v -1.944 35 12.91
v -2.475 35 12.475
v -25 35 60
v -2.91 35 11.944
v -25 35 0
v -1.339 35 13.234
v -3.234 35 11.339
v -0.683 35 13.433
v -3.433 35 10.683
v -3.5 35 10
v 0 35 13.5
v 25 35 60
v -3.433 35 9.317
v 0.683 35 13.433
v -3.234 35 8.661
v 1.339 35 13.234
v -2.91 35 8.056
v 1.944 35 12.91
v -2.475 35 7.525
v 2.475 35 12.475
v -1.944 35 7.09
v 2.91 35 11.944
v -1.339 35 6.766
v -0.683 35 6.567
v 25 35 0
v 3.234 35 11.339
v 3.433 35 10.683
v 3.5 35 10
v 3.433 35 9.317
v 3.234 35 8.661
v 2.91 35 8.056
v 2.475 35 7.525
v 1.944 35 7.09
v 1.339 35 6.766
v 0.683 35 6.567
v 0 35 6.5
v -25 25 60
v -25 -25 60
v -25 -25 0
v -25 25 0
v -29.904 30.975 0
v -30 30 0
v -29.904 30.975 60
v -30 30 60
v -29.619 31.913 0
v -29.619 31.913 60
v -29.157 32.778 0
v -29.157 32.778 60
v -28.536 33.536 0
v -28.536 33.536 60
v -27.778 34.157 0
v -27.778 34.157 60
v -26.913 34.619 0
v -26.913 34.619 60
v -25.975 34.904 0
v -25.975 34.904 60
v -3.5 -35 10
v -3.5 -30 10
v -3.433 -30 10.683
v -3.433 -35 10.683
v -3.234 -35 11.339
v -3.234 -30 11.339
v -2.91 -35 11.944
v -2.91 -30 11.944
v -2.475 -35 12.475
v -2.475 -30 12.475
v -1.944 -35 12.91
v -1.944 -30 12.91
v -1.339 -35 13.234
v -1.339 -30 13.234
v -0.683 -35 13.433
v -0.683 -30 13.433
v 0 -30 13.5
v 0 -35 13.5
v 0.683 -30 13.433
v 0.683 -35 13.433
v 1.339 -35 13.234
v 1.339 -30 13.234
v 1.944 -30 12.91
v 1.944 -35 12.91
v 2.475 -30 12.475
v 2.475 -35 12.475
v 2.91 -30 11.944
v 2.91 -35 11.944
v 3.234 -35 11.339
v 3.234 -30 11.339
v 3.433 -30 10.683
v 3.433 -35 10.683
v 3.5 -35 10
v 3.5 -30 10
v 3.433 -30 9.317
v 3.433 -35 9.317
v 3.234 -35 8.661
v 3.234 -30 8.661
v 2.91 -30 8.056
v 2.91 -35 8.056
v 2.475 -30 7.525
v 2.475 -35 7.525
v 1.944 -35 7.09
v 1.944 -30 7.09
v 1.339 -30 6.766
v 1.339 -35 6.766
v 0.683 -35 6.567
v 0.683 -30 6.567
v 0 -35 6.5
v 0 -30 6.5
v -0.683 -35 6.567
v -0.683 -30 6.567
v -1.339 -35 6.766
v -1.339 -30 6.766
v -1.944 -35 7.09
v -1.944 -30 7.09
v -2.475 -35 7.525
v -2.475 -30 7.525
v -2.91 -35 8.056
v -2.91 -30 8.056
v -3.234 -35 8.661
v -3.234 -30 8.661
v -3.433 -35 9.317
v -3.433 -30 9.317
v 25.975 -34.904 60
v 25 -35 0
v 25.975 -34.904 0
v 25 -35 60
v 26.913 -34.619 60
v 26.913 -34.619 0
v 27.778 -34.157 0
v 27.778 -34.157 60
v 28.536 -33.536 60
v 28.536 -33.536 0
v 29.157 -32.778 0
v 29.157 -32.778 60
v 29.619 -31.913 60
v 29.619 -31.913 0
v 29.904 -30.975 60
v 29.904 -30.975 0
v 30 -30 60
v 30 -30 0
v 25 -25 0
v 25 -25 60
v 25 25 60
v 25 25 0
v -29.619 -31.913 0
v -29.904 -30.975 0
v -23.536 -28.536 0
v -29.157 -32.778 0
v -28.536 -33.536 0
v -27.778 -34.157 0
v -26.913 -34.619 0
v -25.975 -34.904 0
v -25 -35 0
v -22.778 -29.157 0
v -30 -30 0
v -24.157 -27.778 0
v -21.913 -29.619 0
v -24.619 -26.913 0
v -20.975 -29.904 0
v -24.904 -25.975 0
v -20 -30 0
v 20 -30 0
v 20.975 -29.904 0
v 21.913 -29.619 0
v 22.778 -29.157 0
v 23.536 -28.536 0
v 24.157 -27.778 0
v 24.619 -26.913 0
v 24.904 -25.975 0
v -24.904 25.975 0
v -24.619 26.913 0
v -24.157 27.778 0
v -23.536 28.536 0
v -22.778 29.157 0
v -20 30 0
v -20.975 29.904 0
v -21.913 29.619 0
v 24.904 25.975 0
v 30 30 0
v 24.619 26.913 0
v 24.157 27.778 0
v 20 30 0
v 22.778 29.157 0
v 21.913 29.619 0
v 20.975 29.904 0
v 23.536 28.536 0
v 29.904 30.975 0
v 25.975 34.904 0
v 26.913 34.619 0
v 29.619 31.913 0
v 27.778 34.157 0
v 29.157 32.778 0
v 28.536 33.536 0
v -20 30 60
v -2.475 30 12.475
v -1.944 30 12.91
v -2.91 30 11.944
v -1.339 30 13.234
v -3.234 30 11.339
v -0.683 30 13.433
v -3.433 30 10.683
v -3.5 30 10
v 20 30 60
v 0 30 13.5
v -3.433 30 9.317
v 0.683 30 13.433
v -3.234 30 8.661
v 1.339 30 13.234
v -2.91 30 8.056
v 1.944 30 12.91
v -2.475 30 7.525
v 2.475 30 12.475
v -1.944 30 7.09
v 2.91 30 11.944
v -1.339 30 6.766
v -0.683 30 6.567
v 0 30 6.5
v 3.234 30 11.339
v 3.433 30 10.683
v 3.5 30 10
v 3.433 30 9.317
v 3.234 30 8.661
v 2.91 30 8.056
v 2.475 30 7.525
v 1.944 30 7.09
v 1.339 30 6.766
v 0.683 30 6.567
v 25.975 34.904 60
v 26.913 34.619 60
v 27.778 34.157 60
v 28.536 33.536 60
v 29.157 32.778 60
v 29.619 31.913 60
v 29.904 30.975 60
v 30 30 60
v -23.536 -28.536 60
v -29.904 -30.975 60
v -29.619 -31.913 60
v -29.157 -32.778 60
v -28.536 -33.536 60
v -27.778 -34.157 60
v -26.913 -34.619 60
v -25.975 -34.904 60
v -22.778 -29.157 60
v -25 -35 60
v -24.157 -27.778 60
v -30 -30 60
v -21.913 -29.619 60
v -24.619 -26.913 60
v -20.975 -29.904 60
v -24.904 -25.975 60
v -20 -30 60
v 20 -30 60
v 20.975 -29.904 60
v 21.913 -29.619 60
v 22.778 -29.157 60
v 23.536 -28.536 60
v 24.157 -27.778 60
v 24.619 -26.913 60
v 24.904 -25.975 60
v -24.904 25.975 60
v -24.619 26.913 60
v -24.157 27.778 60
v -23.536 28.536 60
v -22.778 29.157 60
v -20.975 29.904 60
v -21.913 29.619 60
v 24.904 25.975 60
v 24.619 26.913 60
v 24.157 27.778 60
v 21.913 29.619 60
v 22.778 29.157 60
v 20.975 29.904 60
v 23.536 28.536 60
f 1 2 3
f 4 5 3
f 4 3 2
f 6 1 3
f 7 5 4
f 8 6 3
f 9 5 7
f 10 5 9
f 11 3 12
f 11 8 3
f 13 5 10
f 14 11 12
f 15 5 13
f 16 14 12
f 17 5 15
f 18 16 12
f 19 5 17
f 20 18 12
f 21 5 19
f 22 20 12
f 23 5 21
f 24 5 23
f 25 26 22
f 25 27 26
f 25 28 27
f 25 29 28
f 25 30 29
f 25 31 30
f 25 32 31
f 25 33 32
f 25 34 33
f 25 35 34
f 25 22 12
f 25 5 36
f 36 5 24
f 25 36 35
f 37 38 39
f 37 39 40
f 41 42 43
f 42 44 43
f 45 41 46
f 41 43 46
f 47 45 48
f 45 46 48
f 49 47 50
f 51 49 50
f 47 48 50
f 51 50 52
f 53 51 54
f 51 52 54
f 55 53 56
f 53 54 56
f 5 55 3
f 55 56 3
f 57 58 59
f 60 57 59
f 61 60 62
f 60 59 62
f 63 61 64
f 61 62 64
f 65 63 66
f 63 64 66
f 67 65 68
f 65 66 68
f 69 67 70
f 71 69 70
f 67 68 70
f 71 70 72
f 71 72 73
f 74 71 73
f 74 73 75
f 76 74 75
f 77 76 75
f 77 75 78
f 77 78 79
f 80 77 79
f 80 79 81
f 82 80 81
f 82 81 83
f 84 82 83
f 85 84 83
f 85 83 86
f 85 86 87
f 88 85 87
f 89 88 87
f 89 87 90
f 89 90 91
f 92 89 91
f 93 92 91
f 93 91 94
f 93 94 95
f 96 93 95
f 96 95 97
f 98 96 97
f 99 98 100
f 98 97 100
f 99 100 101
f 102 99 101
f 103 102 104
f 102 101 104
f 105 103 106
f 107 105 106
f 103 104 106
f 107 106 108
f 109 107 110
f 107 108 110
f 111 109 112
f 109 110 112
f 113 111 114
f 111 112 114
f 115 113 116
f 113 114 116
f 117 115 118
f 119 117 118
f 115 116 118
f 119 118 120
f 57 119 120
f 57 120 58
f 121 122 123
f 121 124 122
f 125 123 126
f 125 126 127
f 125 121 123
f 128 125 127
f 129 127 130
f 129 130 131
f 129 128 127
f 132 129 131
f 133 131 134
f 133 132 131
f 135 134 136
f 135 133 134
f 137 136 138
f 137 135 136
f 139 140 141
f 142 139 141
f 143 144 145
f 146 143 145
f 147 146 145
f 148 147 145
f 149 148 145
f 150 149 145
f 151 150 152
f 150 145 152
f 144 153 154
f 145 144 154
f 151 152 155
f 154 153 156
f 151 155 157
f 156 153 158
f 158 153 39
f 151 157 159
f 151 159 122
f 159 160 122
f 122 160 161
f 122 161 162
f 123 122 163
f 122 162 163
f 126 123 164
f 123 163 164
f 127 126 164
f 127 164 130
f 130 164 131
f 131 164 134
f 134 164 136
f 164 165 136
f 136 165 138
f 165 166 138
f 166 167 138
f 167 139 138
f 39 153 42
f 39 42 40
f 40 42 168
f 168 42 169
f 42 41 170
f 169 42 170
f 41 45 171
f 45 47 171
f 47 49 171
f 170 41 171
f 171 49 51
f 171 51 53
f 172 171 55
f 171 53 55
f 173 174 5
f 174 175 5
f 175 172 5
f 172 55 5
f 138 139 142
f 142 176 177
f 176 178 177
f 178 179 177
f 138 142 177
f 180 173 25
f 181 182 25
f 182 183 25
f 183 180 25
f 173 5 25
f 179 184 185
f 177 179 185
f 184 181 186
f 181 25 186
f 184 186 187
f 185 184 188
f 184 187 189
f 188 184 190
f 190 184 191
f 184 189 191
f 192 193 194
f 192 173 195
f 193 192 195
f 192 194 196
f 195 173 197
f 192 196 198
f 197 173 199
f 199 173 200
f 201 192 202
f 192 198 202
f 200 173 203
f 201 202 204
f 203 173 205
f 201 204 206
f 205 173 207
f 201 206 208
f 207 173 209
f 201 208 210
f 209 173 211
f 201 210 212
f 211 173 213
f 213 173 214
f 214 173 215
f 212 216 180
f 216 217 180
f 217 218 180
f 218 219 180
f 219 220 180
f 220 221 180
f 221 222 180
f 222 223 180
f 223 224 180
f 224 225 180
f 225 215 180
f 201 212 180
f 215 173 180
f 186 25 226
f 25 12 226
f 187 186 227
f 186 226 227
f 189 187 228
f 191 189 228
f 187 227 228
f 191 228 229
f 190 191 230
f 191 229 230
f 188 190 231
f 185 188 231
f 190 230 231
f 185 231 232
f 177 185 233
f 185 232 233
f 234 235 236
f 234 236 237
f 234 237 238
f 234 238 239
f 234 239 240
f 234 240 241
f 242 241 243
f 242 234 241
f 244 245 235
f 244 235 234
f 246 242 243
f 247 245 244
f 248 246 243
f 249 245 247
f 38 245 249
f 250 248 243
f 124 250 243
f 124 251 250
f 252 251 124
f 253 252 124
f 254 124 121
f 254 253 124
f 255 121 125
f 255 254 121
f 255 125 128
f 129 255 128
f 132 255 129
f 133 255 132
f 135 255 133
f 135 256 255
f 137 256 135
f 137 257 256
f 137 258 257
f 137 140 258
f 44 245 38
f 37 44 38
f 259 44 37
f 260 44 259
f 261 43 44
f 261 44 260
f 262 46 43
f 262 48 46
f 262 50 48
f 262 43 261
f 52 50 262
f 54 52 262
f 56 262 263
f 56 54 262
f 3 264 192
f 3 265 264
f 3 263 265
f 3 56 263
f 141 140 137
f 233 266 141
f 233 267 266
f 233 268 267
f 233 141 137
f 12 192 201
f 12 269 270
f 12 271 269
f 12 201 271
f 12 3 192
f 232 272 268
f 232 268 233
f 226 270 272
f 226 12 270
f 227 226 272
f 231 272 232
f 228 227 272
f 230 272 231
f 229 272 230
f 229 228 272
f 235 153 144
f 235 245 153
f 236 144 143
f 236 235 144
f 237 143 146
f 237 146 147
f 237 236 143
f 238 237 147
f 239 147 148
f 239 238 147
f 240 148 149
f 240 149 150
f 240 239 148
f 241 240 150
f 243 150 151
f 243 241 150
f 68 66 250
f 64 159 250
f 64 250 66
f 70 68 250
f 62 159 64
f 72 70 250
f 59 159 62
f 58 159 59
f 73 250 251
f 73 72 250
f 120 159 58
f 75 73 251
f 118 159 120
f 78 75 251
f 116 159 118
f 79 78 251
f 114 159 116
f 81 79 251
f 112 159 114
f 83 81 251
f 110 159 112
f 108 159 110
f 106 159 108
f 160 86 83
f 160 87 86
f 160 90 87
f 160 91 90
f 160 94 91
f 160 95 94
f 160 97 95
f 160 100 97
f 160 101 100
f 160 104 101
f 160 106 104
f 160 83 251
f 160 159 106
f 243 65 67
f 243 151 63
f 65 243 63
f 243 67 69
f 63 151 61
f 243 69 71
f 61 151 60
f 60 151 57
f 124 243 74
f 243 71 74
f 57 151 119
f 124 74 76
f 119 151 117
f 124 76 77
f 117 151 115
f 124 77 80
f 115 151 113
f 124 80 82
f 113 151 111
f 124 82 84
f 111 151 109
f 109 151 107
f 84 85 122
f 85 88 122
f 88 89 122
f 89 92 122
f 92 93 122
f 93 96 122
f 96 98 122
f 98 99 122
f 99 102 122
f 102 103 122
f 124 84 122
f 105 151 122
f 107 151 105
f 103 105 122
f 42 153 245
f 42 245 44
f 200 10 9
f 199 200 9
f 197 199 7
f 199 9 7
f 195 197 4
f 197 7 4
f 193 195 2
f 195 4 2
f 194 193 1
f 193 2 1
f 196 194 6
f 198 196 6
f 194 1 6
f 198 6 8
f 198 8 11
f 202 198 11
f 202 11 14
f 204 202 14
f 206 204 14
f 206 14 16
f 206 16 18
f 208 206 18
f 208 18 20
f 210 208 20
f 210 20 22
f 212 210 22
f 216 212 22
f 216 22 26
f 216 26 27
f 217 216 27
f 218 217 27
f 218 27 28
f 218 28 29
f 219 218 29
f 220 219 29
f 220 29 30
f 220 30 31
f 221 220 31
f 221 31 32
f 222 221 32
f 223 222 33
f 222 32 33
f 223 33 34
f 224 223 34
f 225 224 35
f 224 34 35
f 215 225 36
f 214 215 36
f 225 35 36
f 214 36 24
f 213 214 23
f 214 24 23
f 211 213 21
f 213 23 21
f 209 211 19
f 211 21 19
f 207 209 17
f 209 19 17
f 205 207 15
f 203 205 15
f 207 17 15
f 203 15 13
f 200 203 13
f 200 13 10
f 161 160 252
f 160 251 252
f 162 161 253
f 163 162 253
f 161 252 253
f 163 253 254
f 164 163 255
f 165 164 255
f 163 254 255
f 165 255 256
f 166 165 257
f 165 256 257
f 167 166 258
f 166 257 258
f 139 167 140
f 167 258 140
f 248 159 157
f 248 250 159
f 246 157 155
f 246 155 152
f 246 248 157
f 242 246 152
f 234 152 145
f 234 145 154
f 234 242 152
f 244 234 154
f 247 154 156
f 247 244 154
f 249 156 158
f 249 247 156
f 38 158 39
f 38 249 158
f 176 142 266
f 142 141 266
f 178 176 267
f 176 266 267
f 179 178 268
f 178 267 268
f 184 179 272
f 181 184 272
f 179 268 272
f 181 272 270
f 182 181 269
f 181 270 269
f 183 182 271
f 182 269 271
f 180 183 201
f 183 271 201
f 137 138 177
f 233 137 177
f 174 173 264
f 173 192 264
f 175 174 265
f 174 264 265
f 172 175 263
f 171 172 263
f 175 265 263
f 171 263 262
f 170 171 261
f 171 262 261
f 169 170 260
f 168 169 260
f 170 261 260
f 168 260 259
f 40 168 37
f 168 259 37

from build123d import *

# Parameters (mm, degrees)
F0_W     = 60
F0_H     = 70
F0_W_2   = 50
F0_H_2   = 60
F1_DEPTH = 60
F2_R     = 5
F3_R     = 3.5
F4_DEPTH = 70


with BuildPart() as f1:
    # F0 (on Top) → F1 (new body)
    with BuildSketch(Plane.XY):
        Rectangle(F0_W, F0_H)
        Rectangle(F0_W_2, F0_H_2, mode=Mode.SUBTRACT)
    extrude(amount=F1_DEPTH)

    # F2
    f2_edges = [f1.edges().sort_by_distance(p)[0] for p in [
        (-30, 35, 30),
        (-30, -35, 30),
        (30, -35, 30),
        (30, 35, 30),
        (-25, -30, 30),
        (25, -30, 30),
        (25, 30, 30),
        (-25, 30, 30),
    ]]
    fillet(f2_edges, radius=F2_R)

    # F3 (on face) → F4 (cut)
    with BuildSketch(Plane(origin=(0, 35, 0), x_dir=(-1, 0, 0), z_dir=(0, 1, 0))):
        with Locations((0, 10)):
            Circle(F3_R)
    extrude(amount=-F4_DEPTH, mode=Mode.SUBTRACT)


solid = f1.part
